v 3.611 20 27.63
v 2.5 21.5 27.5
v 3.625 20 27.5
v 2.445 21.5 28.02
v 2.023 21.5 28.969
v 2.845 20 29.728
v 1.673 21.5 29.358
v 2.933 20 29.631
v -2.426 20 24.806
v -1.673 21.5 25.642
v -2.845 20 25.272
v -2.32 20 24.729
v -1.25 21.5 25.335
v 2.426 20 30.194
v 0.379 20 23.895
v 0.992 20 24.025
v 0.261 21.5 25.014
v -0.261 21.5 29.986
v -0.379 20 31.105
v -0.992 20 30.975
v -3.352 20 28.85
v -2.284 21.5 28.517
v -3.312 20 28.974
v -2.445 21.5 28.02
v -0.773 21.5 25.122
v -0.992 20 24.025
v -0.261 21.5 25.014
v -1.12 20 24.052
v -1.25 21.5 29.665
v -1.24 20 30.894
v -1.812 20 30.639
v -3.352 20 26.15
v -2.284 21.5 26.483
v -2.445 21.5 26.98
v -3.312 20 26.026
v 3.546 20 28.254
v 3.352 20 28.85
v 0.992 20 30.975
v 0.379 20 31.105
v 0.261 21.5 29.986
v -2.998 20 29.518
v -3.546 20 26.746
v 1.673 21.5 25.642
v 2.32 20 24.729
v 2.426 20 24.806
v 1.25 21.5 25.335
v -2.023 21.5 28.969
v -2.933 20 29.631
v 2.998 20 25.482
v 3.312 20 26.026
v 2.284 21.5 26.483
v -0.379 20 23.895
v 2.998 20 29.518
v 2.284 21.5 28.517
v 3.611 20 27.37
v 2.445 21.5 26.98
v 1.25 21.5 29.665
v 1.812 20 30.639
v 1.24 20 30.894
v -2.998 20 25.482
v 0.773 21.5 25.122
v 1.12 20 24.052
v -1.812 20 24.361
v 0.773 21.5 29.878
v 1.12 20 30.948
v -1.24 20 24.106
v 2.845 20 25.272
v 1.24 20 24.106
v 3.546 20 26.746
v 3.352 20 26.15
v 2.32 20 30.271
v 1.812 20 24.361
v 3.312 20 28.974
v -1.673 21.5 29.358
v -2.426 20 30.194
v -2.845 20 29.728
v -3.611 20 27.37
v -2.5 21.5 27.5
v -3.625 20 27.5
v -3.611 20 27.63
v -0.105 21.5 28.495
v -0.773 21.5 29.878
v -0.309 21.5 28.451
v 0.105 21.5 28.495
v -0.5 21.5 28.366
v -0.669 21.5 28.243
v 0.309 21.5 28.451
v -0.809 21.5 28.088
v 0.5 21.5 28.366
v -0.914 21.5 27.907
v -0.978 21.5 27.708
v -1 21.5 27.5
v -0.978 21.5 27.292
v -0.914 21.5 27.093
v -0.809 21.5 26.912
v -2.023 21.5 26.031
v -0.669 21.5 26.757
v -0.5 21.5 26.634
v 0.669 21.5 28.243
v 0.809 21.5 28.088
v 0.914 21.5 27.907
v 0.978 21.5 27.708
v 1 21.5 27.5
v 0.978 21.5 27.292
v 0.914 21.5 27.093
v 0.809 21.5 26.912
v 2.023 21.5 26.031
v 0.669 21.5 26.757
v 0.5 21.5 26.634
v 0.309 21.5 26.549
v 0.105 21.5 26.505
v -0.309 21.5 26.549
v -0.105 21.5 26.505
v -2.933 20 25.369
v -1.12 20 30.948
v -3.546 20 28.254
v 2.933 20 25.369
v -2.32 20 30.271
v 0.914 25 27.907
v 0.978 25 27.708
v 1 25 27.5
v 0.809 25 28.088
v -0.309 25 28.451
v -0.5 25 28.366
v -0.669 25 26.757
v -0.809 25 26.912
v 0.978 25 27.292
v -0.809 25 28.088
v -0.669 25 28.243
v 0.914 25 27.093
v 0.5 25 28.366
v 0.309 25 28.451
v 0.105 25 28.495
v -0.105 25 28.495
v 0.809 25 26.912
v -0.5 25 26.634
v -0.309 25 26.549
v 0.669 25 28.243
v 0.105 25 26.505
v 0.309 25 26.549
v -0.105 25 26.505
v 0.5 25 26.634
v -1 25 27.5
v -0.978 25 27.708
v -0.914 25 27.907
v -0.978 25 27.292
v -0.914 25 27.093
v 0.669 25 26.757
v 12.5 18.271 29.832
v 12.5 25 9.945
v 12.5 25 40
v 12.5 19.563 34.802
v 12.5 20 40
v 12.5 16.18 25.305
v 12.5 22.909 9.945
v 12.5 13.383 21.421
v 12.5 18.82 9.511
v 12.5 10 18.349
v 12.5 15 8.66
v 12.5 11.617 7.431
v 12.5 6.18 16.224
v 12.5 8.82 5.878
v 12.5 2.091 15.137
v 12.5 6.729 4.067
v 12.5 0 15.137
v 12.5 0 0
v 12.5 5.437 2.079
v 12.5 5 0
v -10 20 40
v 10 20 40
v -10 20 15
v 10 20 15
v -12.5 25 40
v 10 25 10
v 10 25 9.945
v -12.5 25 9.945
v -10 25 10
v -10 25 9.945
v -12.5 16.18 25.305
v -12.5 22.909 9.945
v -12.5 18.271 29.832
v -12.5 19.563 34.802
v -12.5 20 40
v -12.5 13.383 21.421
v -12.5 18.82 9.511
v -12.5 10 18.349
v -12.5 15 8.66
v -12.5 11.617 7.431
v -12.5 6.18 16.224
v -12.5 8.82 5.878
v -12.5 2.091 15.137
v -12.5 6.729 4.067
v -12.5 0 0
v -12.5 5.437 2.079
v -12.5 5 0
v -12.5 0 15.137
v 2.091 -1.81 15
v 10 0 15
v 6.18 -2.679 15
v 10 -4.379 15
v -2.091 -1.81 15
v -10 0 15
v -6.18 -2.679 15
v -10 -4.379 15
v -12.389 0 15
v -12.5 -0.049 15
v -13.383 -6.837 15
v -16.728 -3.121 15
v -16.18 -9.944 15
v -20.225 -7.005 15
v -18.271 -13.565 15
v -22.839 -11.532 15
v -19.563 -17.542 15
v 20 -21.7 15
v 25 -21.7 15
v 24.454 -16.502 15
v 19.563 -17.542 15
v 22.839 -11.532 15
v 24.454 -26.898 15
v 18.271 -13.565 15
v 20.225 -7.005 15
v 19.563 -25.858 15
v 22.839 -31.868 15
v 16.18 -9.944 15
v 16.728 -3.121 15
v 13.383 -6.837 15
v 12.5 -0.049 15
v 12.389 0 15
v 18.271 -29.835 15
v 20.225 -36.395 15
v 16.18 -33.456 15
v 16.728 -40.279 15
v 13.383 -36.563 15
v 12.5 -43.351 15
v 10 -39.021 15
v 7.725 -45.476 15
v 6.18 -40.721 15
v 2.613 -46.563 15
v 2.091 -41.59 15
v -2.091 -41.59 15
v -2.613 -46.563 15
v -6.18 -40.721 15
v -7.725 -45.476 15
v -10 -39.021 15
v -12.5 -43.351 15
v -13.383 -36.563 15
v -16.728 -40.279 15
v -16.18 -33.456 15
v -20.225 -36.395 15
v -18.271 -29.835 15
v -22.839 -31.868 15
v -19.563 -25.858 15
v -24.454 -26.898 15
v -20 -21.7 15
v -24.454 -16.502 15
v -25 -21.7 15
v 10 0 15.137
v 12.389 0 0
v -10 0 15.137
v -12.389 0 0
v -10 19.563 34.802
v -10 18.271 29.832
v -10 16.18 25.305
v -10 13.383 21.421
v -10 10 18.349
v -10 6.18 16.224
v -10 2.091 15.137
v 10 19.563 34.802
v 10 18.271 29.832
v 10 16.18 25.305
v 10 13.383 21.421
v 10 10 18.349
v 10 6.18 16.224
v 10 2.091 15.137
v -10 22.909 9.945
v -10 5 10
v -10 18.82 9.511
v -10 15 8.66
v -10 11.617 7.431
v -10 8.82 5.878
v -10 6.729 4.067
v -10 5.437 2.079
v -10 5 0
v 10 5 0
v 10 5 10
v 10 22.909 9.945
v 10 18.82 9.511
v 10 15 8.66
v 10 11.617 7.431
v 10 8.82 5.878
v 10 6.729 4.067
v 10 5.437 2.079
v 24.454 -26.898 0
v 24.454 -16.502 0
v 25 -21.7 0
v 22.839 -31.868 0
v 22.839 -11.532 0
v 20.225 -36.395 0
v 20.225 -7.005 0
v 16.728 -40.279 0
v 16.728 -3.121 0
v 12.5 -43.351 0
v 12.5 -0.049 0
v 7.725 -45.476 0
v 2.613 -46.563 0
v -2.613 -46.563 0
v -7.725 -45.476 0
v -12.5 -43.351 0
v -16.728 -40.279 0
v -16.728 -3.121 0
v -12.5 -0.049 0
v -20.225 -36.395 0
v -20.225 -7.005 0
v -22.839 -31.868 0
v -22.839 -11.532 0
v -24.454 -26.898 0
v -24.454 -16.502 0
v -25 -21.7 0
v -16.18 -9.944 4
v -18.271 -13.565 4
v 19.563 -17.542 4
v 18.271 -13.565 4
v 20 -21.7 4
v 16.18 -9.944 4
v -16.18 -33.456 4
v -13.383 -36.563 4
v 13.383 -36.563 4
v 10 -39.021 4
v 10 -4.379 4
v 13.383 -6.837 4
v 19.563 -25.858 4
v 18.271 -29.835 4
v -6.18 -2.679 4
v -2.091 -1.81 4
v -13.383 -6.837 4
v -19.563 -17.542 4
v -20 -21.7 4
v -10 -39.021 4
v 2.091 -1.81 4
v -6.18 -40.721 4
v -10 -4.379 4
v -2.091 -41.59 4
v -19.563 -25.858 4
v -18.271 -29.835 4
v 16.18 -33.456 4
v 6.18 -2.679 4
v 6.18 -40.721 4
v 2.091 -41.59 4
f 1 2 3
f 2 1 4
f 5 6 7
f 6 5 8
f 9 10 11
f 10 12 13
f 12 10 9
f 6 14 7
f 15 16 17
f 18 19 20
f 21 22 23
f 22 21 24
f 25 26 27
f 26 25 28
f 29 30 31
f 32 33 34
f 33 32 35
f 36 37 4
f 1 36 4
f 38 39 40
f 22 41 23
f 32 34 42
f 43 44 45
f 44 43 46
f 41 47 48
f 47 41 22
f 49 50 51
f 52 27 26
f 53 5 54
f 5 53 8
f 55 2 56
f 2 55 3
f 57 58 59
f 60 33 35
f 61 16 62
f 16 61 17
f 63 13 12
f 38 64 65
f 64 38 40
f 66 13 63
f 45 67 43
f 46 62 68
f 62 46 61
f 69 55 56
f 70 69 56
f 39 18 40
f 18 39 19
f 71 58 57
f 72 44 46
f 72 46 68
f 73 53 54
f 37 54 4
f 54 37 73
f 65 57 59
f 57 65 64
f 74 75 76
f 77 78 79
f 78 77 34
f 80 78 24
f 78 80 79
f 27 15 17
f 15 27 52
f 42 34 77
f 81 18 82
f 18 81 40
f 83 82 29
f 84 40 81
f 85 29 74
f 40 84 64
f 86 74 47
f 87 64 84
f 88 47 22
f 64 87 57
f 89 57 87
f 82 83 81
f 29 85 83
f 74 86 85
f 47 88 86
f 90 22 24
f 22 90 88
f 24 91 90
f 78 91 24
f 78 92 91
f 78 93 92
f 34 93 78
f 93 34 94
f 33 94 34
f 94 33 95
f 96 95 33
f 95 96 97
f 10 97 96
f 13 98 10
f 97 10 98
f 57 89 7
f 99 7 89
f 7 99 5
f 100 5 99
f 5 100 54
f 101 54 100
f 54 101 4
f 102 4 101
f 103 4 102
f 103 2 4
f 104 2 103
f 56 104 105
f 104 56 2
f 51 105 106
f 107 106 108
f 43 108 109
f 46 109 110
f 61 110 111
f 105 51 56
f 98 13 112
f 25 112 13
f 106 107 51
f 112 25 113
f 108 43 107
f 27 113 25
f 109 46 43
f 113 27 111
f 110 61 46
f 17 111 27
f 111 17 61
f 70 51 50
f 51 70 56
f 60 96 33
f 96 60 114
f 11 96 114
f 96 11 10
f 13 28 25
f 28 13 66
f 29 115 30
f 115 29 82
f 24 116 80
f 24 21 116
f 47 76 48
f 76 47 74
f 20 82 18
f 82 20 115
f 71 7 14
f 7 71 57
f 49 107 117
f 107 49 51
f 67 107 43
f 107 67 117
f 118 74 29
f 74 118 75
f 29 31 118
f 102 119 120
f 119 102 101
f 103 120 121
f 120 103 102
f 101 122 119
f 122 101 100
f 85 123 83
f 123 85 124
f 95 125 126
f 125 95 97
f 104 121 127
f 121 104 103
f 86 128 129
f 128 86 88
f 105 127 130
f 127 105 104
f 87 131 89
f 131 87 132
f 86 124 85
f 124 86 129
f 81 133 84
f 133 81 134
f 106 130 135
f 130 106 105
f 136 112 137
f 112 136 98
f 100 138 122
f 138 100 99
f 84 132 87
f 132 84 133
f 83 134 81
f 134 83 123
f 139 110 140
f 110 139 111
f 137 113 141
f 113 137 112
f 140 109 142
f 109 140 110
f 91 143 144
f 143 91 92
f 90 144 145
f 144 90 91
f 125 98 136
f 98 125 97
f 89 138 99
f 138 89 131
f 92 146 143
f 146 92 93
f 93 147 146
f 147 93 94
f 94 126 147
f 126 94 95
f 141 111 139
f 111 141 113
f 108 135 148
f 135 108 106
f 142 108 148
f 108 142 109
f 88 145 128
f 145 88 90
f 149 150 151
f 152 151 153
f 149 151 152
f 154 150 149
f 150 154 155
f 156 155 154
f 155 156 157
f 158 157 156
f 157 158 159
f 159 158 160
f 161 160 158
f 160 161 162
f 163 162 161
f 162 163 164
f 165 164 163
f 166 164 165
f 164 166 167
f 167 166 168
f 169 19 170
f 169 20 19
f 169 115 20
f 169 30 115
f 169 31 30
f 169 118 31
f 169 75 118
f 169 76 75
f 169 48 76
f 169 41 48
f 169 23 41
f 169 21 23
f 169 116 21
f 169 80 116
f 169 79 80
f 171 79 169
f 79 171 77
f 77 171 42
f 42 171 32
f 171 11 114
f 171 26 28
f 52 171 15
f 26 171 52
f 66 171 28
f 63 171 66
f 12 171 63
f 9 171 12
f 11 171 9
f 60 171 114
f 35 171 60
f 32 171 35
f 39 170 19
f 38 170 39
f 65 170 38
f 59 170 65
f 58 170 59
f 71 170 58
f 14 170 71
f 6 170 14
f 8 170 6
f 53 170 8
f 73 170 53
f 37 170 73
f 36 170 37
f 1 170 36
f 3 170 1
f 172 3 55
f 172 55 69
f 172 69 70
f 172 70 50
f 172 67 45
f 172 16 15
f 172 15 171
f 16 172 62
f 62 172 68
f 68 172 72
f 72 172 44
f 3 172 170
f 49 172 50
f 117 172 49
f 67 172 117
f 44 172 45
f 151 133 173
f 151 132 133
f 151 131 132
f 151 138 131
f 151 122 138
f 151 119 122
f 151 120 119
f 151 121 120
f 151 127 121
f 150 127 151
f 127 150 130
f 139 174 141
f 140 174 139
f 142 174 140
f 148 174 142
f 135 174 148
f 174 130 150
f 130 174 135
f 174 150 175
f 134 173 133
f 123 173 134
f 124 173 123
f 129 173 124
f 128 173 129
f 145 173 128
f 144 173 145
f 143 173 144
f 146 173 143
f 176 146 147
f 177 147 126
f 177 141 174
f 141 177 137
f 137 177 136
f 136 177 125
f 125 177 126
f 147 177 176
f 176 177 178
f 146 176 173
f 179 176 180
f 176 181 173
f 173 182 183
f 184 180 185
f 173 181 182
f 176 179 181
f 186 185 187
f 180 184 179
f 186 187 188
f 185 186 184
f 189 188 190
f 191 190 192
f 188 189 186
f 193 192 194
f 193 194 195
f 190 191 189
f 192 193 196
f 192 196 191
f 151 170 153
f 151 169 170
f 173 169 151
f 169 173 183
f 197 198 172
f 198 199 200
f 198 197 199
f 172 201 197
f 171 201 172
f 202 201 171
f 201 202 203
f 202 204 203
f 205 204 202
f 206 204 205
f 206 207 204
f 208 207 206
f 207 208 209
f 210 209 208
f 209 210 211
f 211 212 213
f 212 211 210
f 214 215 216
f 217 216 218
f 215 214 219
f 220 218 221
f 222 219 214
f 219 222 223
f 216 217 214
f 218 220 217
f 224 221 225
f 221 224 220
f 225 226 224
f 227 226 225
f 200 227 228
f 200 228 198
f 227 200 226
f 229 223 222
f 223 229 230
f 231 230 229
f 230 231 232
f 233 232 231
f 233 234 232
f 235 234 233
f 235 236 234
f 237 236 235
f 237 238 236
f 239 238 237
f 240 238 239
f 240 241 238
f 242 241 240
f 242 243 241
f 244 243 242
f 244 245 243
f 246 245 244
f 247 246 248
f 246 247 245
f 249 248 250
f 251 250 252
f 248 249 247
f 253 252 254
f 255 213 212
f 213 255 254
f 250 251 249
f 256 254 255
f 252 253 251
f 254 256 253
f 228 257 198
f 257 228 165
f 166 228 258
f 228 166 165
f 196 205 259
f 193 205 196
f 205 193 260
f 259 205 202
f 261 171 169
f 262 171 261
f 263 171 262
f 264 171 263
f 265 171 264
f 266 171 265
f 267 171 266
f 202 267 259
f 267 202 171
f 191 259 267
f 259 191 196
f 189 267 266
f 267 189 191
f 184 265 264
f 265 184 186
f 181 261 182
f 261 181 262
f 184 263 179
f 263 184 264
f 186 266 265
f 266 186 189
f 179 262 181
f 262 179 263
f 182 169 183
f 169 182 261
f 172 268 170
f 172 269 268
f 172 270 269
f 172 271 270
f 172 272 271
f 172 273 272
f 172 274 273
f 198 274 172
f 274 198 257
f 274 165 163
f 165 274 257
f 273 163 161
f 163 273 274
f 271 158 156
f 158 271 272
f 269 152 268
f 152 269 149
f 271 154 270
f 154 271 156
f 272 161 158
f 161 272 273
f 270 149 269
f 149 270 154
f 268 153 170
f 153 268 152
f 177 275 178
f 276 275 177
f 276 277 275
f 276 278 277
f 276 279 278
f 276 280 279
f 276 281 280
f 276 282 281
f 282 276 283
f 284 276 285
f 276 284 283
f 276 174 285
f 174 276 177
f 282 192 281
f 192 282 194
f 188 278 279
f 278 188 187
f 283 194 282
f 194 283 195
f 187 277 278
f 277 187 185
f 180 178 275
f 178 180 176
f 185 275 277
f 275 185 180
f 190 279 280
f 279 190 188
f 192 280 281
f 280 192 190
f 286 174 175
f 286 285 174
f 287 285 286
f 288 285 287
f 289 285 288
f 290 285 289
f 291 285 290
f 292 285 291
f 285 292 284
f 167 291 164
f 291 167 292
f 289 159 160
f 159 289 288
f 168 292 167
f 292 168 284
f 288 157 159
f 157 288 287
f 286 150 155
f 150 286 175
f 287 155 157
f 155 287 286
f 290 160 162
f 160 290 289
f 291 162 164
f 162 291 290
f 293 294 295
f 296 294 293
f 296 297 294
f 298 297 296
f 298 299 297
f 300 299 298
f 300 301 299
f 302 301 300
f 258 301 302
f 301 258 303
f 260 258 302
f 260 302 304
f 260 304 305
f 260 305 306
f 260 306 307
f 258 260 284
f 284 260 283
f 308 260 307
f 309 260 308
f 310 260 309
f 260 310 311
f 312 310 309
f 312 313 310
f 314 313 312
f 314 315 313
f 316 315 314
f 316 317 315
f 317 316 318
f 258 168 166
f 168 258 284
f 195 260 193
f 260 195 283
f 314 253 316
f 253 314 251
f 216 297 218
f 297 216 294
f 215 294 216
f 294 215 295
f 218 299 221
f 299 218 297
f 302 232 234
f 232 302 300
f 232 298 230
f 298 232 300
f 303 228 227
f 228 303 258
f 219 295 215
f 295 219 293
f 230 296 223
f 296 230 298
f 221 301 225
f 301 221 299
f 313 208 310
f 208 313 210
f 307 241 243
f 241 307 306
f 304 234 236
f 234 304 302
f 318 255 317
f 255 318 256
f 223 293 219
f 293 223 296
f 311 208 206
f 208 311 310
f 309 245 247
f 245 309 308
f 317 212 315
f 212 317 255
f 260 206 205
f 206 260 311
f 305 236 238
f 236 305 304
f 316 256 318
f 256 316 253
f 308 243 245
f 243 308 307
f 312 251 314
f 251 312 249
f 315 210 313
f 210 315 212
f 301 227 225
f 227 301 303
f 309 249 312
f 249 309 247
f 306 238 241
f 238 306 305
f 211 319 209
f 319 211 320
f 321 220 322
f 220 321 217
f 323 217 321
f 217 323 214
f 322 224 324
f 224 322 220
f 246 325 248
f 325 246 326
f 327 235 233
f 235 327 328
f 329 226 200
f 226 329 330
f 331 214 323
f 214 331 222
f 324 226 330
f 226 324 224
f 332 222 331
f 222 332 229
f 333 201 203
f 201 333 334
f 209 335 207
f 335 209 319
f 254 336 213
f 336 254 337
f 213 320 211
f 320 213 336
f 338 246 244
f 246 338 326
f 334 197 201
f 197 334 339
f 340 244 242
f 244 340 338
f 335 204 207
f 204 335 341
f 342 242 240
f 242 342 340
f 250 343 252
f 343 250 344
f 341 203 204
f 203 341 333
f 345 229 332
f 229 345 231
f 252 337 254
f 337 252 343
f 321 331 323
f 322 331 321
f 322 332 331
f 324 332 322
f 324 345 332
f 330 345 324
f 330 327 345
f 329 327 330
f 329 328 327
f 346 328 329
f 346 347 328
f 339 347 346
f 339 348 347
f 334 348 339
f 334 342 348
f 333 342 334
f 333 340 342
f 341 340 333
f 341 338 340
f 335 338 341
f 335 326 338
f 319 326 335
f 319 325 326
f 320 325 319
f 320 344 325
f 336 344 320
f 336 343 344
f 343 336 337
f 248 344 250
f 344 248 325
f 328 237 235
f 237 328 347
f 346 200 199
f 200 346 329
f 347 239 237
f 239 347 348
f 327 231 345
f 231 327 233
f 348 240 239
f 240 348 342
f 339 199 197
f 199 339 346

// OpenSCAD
$fn = 30;

module screw(d) {
  head_outer = 8;
  head_inner = 5;
  head_depth = 2;

  radius = 1.2;

  translate([0, 0, -head_depth])
  cylinder(
    r1 = head_inner/2,
    r2 = head_outer/2,
    h  = head_depth);

  translate([0, 0, -d])
  cylinder(radius, h=d);
}

module plate(w, h, d, screw_hole=false) {
  difference() {
    cube([w, h, d]);

    if(screw_hole) {
      translate([w/2, h/2, d+0.5])
      screw(d+1);
    }
  }
}

module support(x0, y0, x1, y1, d=1) {
  rx = x1-x0;
  if(rx < 0) {
    echo("dx < 0", rx);
  }
  ry = y0-y1;
  if(ry < 0) {
    echo("dy < 0", rx);
  }

  ratio_y = ry / rx;

  difference() {
    translate([x0, y1])
    cube([rx, ry, d]);

    translate([x1, y0, -0.5])
    scale([1, ratio_y, 1])
    cylinder(r=x1-x0, h=d+1);
  }
}

module upper_support(w, l0, l1, l2) {
  rotate([0, -90, 0])
  support(
    x0 = 0,
    y0 = l0,
    x1 = l1,
    y1 = 0,
    d  = w);
}

module lower_support(w, d, l1, l2) {
  translate([w, -d, d])
  rotate([0, 90, 180])
  translate([-l1+d, l2, 0])
  support(
    x0 = 0,
    y0 = -d,
    x1 = l1,
    y1 = -l2,
    d  = w);
}


module _s_bracket(w, d, l0, l1, l2) {
  support_width = d/2;

  plate(w, l0, d, screw_hole=true);

  rotate([90, 0, 0])
  plate(w, l1, d);

  translate([0, -l2, l1])
  plate(w, l2, d);

  // Upper left support
  translate([support_width, 0, d])
  upper_support(support_width, l0, l1, l2);

  // Upper right support
  translate([w, 0, d])
  upper_support(support_width, l0, l1, l2);

  // Lower left support
  lower_support(support_width, d, l1, l2);

  // Lower right suport
  translate([w-support_width, 0, 0])
  lower_support(support_width, d, l1, l2);
}

module s_bracket(w, d, l0, l1, l2) {
  rotate([90, 0, 0])
  translate([-w/2, l2, -l1-d])
  _s_bracket(w, d, l0, l1, l2);
}

module bottom_bracket(w, d, r, l0, l1, l2) {
  support_w = 2.5;
  support_d = 4;

  difference() {
    union() {
      s_bracket(w, d, l0, l1, l2);

      translate([0, -r+3.3, 0])
      cylinder(r=r, h=l2);
    }

    translate([0, -r+3.3, support_d])
    cylinder(r=r-(support_w*2), h=l2-support_d+1);
  }
}

bottom_bracket(
  w  =25,
  d  = 5,
  r  = 25,
  l0 = 25,
  l1 = 20,
  l2 = 15);

// module screw() {
//   translate([12, 12, 24-screw_head_depth])
//   cylinder(
//     r1=screw_head_inner,
//     r2=screw_head_outer,
//     h=screw_head_depth);
//   
//   translate([12, 12])
//   cylinder(r=screw_radius, h=24);
// }
// 
// difference() {
//   cube(24);
//   screw();
// }
